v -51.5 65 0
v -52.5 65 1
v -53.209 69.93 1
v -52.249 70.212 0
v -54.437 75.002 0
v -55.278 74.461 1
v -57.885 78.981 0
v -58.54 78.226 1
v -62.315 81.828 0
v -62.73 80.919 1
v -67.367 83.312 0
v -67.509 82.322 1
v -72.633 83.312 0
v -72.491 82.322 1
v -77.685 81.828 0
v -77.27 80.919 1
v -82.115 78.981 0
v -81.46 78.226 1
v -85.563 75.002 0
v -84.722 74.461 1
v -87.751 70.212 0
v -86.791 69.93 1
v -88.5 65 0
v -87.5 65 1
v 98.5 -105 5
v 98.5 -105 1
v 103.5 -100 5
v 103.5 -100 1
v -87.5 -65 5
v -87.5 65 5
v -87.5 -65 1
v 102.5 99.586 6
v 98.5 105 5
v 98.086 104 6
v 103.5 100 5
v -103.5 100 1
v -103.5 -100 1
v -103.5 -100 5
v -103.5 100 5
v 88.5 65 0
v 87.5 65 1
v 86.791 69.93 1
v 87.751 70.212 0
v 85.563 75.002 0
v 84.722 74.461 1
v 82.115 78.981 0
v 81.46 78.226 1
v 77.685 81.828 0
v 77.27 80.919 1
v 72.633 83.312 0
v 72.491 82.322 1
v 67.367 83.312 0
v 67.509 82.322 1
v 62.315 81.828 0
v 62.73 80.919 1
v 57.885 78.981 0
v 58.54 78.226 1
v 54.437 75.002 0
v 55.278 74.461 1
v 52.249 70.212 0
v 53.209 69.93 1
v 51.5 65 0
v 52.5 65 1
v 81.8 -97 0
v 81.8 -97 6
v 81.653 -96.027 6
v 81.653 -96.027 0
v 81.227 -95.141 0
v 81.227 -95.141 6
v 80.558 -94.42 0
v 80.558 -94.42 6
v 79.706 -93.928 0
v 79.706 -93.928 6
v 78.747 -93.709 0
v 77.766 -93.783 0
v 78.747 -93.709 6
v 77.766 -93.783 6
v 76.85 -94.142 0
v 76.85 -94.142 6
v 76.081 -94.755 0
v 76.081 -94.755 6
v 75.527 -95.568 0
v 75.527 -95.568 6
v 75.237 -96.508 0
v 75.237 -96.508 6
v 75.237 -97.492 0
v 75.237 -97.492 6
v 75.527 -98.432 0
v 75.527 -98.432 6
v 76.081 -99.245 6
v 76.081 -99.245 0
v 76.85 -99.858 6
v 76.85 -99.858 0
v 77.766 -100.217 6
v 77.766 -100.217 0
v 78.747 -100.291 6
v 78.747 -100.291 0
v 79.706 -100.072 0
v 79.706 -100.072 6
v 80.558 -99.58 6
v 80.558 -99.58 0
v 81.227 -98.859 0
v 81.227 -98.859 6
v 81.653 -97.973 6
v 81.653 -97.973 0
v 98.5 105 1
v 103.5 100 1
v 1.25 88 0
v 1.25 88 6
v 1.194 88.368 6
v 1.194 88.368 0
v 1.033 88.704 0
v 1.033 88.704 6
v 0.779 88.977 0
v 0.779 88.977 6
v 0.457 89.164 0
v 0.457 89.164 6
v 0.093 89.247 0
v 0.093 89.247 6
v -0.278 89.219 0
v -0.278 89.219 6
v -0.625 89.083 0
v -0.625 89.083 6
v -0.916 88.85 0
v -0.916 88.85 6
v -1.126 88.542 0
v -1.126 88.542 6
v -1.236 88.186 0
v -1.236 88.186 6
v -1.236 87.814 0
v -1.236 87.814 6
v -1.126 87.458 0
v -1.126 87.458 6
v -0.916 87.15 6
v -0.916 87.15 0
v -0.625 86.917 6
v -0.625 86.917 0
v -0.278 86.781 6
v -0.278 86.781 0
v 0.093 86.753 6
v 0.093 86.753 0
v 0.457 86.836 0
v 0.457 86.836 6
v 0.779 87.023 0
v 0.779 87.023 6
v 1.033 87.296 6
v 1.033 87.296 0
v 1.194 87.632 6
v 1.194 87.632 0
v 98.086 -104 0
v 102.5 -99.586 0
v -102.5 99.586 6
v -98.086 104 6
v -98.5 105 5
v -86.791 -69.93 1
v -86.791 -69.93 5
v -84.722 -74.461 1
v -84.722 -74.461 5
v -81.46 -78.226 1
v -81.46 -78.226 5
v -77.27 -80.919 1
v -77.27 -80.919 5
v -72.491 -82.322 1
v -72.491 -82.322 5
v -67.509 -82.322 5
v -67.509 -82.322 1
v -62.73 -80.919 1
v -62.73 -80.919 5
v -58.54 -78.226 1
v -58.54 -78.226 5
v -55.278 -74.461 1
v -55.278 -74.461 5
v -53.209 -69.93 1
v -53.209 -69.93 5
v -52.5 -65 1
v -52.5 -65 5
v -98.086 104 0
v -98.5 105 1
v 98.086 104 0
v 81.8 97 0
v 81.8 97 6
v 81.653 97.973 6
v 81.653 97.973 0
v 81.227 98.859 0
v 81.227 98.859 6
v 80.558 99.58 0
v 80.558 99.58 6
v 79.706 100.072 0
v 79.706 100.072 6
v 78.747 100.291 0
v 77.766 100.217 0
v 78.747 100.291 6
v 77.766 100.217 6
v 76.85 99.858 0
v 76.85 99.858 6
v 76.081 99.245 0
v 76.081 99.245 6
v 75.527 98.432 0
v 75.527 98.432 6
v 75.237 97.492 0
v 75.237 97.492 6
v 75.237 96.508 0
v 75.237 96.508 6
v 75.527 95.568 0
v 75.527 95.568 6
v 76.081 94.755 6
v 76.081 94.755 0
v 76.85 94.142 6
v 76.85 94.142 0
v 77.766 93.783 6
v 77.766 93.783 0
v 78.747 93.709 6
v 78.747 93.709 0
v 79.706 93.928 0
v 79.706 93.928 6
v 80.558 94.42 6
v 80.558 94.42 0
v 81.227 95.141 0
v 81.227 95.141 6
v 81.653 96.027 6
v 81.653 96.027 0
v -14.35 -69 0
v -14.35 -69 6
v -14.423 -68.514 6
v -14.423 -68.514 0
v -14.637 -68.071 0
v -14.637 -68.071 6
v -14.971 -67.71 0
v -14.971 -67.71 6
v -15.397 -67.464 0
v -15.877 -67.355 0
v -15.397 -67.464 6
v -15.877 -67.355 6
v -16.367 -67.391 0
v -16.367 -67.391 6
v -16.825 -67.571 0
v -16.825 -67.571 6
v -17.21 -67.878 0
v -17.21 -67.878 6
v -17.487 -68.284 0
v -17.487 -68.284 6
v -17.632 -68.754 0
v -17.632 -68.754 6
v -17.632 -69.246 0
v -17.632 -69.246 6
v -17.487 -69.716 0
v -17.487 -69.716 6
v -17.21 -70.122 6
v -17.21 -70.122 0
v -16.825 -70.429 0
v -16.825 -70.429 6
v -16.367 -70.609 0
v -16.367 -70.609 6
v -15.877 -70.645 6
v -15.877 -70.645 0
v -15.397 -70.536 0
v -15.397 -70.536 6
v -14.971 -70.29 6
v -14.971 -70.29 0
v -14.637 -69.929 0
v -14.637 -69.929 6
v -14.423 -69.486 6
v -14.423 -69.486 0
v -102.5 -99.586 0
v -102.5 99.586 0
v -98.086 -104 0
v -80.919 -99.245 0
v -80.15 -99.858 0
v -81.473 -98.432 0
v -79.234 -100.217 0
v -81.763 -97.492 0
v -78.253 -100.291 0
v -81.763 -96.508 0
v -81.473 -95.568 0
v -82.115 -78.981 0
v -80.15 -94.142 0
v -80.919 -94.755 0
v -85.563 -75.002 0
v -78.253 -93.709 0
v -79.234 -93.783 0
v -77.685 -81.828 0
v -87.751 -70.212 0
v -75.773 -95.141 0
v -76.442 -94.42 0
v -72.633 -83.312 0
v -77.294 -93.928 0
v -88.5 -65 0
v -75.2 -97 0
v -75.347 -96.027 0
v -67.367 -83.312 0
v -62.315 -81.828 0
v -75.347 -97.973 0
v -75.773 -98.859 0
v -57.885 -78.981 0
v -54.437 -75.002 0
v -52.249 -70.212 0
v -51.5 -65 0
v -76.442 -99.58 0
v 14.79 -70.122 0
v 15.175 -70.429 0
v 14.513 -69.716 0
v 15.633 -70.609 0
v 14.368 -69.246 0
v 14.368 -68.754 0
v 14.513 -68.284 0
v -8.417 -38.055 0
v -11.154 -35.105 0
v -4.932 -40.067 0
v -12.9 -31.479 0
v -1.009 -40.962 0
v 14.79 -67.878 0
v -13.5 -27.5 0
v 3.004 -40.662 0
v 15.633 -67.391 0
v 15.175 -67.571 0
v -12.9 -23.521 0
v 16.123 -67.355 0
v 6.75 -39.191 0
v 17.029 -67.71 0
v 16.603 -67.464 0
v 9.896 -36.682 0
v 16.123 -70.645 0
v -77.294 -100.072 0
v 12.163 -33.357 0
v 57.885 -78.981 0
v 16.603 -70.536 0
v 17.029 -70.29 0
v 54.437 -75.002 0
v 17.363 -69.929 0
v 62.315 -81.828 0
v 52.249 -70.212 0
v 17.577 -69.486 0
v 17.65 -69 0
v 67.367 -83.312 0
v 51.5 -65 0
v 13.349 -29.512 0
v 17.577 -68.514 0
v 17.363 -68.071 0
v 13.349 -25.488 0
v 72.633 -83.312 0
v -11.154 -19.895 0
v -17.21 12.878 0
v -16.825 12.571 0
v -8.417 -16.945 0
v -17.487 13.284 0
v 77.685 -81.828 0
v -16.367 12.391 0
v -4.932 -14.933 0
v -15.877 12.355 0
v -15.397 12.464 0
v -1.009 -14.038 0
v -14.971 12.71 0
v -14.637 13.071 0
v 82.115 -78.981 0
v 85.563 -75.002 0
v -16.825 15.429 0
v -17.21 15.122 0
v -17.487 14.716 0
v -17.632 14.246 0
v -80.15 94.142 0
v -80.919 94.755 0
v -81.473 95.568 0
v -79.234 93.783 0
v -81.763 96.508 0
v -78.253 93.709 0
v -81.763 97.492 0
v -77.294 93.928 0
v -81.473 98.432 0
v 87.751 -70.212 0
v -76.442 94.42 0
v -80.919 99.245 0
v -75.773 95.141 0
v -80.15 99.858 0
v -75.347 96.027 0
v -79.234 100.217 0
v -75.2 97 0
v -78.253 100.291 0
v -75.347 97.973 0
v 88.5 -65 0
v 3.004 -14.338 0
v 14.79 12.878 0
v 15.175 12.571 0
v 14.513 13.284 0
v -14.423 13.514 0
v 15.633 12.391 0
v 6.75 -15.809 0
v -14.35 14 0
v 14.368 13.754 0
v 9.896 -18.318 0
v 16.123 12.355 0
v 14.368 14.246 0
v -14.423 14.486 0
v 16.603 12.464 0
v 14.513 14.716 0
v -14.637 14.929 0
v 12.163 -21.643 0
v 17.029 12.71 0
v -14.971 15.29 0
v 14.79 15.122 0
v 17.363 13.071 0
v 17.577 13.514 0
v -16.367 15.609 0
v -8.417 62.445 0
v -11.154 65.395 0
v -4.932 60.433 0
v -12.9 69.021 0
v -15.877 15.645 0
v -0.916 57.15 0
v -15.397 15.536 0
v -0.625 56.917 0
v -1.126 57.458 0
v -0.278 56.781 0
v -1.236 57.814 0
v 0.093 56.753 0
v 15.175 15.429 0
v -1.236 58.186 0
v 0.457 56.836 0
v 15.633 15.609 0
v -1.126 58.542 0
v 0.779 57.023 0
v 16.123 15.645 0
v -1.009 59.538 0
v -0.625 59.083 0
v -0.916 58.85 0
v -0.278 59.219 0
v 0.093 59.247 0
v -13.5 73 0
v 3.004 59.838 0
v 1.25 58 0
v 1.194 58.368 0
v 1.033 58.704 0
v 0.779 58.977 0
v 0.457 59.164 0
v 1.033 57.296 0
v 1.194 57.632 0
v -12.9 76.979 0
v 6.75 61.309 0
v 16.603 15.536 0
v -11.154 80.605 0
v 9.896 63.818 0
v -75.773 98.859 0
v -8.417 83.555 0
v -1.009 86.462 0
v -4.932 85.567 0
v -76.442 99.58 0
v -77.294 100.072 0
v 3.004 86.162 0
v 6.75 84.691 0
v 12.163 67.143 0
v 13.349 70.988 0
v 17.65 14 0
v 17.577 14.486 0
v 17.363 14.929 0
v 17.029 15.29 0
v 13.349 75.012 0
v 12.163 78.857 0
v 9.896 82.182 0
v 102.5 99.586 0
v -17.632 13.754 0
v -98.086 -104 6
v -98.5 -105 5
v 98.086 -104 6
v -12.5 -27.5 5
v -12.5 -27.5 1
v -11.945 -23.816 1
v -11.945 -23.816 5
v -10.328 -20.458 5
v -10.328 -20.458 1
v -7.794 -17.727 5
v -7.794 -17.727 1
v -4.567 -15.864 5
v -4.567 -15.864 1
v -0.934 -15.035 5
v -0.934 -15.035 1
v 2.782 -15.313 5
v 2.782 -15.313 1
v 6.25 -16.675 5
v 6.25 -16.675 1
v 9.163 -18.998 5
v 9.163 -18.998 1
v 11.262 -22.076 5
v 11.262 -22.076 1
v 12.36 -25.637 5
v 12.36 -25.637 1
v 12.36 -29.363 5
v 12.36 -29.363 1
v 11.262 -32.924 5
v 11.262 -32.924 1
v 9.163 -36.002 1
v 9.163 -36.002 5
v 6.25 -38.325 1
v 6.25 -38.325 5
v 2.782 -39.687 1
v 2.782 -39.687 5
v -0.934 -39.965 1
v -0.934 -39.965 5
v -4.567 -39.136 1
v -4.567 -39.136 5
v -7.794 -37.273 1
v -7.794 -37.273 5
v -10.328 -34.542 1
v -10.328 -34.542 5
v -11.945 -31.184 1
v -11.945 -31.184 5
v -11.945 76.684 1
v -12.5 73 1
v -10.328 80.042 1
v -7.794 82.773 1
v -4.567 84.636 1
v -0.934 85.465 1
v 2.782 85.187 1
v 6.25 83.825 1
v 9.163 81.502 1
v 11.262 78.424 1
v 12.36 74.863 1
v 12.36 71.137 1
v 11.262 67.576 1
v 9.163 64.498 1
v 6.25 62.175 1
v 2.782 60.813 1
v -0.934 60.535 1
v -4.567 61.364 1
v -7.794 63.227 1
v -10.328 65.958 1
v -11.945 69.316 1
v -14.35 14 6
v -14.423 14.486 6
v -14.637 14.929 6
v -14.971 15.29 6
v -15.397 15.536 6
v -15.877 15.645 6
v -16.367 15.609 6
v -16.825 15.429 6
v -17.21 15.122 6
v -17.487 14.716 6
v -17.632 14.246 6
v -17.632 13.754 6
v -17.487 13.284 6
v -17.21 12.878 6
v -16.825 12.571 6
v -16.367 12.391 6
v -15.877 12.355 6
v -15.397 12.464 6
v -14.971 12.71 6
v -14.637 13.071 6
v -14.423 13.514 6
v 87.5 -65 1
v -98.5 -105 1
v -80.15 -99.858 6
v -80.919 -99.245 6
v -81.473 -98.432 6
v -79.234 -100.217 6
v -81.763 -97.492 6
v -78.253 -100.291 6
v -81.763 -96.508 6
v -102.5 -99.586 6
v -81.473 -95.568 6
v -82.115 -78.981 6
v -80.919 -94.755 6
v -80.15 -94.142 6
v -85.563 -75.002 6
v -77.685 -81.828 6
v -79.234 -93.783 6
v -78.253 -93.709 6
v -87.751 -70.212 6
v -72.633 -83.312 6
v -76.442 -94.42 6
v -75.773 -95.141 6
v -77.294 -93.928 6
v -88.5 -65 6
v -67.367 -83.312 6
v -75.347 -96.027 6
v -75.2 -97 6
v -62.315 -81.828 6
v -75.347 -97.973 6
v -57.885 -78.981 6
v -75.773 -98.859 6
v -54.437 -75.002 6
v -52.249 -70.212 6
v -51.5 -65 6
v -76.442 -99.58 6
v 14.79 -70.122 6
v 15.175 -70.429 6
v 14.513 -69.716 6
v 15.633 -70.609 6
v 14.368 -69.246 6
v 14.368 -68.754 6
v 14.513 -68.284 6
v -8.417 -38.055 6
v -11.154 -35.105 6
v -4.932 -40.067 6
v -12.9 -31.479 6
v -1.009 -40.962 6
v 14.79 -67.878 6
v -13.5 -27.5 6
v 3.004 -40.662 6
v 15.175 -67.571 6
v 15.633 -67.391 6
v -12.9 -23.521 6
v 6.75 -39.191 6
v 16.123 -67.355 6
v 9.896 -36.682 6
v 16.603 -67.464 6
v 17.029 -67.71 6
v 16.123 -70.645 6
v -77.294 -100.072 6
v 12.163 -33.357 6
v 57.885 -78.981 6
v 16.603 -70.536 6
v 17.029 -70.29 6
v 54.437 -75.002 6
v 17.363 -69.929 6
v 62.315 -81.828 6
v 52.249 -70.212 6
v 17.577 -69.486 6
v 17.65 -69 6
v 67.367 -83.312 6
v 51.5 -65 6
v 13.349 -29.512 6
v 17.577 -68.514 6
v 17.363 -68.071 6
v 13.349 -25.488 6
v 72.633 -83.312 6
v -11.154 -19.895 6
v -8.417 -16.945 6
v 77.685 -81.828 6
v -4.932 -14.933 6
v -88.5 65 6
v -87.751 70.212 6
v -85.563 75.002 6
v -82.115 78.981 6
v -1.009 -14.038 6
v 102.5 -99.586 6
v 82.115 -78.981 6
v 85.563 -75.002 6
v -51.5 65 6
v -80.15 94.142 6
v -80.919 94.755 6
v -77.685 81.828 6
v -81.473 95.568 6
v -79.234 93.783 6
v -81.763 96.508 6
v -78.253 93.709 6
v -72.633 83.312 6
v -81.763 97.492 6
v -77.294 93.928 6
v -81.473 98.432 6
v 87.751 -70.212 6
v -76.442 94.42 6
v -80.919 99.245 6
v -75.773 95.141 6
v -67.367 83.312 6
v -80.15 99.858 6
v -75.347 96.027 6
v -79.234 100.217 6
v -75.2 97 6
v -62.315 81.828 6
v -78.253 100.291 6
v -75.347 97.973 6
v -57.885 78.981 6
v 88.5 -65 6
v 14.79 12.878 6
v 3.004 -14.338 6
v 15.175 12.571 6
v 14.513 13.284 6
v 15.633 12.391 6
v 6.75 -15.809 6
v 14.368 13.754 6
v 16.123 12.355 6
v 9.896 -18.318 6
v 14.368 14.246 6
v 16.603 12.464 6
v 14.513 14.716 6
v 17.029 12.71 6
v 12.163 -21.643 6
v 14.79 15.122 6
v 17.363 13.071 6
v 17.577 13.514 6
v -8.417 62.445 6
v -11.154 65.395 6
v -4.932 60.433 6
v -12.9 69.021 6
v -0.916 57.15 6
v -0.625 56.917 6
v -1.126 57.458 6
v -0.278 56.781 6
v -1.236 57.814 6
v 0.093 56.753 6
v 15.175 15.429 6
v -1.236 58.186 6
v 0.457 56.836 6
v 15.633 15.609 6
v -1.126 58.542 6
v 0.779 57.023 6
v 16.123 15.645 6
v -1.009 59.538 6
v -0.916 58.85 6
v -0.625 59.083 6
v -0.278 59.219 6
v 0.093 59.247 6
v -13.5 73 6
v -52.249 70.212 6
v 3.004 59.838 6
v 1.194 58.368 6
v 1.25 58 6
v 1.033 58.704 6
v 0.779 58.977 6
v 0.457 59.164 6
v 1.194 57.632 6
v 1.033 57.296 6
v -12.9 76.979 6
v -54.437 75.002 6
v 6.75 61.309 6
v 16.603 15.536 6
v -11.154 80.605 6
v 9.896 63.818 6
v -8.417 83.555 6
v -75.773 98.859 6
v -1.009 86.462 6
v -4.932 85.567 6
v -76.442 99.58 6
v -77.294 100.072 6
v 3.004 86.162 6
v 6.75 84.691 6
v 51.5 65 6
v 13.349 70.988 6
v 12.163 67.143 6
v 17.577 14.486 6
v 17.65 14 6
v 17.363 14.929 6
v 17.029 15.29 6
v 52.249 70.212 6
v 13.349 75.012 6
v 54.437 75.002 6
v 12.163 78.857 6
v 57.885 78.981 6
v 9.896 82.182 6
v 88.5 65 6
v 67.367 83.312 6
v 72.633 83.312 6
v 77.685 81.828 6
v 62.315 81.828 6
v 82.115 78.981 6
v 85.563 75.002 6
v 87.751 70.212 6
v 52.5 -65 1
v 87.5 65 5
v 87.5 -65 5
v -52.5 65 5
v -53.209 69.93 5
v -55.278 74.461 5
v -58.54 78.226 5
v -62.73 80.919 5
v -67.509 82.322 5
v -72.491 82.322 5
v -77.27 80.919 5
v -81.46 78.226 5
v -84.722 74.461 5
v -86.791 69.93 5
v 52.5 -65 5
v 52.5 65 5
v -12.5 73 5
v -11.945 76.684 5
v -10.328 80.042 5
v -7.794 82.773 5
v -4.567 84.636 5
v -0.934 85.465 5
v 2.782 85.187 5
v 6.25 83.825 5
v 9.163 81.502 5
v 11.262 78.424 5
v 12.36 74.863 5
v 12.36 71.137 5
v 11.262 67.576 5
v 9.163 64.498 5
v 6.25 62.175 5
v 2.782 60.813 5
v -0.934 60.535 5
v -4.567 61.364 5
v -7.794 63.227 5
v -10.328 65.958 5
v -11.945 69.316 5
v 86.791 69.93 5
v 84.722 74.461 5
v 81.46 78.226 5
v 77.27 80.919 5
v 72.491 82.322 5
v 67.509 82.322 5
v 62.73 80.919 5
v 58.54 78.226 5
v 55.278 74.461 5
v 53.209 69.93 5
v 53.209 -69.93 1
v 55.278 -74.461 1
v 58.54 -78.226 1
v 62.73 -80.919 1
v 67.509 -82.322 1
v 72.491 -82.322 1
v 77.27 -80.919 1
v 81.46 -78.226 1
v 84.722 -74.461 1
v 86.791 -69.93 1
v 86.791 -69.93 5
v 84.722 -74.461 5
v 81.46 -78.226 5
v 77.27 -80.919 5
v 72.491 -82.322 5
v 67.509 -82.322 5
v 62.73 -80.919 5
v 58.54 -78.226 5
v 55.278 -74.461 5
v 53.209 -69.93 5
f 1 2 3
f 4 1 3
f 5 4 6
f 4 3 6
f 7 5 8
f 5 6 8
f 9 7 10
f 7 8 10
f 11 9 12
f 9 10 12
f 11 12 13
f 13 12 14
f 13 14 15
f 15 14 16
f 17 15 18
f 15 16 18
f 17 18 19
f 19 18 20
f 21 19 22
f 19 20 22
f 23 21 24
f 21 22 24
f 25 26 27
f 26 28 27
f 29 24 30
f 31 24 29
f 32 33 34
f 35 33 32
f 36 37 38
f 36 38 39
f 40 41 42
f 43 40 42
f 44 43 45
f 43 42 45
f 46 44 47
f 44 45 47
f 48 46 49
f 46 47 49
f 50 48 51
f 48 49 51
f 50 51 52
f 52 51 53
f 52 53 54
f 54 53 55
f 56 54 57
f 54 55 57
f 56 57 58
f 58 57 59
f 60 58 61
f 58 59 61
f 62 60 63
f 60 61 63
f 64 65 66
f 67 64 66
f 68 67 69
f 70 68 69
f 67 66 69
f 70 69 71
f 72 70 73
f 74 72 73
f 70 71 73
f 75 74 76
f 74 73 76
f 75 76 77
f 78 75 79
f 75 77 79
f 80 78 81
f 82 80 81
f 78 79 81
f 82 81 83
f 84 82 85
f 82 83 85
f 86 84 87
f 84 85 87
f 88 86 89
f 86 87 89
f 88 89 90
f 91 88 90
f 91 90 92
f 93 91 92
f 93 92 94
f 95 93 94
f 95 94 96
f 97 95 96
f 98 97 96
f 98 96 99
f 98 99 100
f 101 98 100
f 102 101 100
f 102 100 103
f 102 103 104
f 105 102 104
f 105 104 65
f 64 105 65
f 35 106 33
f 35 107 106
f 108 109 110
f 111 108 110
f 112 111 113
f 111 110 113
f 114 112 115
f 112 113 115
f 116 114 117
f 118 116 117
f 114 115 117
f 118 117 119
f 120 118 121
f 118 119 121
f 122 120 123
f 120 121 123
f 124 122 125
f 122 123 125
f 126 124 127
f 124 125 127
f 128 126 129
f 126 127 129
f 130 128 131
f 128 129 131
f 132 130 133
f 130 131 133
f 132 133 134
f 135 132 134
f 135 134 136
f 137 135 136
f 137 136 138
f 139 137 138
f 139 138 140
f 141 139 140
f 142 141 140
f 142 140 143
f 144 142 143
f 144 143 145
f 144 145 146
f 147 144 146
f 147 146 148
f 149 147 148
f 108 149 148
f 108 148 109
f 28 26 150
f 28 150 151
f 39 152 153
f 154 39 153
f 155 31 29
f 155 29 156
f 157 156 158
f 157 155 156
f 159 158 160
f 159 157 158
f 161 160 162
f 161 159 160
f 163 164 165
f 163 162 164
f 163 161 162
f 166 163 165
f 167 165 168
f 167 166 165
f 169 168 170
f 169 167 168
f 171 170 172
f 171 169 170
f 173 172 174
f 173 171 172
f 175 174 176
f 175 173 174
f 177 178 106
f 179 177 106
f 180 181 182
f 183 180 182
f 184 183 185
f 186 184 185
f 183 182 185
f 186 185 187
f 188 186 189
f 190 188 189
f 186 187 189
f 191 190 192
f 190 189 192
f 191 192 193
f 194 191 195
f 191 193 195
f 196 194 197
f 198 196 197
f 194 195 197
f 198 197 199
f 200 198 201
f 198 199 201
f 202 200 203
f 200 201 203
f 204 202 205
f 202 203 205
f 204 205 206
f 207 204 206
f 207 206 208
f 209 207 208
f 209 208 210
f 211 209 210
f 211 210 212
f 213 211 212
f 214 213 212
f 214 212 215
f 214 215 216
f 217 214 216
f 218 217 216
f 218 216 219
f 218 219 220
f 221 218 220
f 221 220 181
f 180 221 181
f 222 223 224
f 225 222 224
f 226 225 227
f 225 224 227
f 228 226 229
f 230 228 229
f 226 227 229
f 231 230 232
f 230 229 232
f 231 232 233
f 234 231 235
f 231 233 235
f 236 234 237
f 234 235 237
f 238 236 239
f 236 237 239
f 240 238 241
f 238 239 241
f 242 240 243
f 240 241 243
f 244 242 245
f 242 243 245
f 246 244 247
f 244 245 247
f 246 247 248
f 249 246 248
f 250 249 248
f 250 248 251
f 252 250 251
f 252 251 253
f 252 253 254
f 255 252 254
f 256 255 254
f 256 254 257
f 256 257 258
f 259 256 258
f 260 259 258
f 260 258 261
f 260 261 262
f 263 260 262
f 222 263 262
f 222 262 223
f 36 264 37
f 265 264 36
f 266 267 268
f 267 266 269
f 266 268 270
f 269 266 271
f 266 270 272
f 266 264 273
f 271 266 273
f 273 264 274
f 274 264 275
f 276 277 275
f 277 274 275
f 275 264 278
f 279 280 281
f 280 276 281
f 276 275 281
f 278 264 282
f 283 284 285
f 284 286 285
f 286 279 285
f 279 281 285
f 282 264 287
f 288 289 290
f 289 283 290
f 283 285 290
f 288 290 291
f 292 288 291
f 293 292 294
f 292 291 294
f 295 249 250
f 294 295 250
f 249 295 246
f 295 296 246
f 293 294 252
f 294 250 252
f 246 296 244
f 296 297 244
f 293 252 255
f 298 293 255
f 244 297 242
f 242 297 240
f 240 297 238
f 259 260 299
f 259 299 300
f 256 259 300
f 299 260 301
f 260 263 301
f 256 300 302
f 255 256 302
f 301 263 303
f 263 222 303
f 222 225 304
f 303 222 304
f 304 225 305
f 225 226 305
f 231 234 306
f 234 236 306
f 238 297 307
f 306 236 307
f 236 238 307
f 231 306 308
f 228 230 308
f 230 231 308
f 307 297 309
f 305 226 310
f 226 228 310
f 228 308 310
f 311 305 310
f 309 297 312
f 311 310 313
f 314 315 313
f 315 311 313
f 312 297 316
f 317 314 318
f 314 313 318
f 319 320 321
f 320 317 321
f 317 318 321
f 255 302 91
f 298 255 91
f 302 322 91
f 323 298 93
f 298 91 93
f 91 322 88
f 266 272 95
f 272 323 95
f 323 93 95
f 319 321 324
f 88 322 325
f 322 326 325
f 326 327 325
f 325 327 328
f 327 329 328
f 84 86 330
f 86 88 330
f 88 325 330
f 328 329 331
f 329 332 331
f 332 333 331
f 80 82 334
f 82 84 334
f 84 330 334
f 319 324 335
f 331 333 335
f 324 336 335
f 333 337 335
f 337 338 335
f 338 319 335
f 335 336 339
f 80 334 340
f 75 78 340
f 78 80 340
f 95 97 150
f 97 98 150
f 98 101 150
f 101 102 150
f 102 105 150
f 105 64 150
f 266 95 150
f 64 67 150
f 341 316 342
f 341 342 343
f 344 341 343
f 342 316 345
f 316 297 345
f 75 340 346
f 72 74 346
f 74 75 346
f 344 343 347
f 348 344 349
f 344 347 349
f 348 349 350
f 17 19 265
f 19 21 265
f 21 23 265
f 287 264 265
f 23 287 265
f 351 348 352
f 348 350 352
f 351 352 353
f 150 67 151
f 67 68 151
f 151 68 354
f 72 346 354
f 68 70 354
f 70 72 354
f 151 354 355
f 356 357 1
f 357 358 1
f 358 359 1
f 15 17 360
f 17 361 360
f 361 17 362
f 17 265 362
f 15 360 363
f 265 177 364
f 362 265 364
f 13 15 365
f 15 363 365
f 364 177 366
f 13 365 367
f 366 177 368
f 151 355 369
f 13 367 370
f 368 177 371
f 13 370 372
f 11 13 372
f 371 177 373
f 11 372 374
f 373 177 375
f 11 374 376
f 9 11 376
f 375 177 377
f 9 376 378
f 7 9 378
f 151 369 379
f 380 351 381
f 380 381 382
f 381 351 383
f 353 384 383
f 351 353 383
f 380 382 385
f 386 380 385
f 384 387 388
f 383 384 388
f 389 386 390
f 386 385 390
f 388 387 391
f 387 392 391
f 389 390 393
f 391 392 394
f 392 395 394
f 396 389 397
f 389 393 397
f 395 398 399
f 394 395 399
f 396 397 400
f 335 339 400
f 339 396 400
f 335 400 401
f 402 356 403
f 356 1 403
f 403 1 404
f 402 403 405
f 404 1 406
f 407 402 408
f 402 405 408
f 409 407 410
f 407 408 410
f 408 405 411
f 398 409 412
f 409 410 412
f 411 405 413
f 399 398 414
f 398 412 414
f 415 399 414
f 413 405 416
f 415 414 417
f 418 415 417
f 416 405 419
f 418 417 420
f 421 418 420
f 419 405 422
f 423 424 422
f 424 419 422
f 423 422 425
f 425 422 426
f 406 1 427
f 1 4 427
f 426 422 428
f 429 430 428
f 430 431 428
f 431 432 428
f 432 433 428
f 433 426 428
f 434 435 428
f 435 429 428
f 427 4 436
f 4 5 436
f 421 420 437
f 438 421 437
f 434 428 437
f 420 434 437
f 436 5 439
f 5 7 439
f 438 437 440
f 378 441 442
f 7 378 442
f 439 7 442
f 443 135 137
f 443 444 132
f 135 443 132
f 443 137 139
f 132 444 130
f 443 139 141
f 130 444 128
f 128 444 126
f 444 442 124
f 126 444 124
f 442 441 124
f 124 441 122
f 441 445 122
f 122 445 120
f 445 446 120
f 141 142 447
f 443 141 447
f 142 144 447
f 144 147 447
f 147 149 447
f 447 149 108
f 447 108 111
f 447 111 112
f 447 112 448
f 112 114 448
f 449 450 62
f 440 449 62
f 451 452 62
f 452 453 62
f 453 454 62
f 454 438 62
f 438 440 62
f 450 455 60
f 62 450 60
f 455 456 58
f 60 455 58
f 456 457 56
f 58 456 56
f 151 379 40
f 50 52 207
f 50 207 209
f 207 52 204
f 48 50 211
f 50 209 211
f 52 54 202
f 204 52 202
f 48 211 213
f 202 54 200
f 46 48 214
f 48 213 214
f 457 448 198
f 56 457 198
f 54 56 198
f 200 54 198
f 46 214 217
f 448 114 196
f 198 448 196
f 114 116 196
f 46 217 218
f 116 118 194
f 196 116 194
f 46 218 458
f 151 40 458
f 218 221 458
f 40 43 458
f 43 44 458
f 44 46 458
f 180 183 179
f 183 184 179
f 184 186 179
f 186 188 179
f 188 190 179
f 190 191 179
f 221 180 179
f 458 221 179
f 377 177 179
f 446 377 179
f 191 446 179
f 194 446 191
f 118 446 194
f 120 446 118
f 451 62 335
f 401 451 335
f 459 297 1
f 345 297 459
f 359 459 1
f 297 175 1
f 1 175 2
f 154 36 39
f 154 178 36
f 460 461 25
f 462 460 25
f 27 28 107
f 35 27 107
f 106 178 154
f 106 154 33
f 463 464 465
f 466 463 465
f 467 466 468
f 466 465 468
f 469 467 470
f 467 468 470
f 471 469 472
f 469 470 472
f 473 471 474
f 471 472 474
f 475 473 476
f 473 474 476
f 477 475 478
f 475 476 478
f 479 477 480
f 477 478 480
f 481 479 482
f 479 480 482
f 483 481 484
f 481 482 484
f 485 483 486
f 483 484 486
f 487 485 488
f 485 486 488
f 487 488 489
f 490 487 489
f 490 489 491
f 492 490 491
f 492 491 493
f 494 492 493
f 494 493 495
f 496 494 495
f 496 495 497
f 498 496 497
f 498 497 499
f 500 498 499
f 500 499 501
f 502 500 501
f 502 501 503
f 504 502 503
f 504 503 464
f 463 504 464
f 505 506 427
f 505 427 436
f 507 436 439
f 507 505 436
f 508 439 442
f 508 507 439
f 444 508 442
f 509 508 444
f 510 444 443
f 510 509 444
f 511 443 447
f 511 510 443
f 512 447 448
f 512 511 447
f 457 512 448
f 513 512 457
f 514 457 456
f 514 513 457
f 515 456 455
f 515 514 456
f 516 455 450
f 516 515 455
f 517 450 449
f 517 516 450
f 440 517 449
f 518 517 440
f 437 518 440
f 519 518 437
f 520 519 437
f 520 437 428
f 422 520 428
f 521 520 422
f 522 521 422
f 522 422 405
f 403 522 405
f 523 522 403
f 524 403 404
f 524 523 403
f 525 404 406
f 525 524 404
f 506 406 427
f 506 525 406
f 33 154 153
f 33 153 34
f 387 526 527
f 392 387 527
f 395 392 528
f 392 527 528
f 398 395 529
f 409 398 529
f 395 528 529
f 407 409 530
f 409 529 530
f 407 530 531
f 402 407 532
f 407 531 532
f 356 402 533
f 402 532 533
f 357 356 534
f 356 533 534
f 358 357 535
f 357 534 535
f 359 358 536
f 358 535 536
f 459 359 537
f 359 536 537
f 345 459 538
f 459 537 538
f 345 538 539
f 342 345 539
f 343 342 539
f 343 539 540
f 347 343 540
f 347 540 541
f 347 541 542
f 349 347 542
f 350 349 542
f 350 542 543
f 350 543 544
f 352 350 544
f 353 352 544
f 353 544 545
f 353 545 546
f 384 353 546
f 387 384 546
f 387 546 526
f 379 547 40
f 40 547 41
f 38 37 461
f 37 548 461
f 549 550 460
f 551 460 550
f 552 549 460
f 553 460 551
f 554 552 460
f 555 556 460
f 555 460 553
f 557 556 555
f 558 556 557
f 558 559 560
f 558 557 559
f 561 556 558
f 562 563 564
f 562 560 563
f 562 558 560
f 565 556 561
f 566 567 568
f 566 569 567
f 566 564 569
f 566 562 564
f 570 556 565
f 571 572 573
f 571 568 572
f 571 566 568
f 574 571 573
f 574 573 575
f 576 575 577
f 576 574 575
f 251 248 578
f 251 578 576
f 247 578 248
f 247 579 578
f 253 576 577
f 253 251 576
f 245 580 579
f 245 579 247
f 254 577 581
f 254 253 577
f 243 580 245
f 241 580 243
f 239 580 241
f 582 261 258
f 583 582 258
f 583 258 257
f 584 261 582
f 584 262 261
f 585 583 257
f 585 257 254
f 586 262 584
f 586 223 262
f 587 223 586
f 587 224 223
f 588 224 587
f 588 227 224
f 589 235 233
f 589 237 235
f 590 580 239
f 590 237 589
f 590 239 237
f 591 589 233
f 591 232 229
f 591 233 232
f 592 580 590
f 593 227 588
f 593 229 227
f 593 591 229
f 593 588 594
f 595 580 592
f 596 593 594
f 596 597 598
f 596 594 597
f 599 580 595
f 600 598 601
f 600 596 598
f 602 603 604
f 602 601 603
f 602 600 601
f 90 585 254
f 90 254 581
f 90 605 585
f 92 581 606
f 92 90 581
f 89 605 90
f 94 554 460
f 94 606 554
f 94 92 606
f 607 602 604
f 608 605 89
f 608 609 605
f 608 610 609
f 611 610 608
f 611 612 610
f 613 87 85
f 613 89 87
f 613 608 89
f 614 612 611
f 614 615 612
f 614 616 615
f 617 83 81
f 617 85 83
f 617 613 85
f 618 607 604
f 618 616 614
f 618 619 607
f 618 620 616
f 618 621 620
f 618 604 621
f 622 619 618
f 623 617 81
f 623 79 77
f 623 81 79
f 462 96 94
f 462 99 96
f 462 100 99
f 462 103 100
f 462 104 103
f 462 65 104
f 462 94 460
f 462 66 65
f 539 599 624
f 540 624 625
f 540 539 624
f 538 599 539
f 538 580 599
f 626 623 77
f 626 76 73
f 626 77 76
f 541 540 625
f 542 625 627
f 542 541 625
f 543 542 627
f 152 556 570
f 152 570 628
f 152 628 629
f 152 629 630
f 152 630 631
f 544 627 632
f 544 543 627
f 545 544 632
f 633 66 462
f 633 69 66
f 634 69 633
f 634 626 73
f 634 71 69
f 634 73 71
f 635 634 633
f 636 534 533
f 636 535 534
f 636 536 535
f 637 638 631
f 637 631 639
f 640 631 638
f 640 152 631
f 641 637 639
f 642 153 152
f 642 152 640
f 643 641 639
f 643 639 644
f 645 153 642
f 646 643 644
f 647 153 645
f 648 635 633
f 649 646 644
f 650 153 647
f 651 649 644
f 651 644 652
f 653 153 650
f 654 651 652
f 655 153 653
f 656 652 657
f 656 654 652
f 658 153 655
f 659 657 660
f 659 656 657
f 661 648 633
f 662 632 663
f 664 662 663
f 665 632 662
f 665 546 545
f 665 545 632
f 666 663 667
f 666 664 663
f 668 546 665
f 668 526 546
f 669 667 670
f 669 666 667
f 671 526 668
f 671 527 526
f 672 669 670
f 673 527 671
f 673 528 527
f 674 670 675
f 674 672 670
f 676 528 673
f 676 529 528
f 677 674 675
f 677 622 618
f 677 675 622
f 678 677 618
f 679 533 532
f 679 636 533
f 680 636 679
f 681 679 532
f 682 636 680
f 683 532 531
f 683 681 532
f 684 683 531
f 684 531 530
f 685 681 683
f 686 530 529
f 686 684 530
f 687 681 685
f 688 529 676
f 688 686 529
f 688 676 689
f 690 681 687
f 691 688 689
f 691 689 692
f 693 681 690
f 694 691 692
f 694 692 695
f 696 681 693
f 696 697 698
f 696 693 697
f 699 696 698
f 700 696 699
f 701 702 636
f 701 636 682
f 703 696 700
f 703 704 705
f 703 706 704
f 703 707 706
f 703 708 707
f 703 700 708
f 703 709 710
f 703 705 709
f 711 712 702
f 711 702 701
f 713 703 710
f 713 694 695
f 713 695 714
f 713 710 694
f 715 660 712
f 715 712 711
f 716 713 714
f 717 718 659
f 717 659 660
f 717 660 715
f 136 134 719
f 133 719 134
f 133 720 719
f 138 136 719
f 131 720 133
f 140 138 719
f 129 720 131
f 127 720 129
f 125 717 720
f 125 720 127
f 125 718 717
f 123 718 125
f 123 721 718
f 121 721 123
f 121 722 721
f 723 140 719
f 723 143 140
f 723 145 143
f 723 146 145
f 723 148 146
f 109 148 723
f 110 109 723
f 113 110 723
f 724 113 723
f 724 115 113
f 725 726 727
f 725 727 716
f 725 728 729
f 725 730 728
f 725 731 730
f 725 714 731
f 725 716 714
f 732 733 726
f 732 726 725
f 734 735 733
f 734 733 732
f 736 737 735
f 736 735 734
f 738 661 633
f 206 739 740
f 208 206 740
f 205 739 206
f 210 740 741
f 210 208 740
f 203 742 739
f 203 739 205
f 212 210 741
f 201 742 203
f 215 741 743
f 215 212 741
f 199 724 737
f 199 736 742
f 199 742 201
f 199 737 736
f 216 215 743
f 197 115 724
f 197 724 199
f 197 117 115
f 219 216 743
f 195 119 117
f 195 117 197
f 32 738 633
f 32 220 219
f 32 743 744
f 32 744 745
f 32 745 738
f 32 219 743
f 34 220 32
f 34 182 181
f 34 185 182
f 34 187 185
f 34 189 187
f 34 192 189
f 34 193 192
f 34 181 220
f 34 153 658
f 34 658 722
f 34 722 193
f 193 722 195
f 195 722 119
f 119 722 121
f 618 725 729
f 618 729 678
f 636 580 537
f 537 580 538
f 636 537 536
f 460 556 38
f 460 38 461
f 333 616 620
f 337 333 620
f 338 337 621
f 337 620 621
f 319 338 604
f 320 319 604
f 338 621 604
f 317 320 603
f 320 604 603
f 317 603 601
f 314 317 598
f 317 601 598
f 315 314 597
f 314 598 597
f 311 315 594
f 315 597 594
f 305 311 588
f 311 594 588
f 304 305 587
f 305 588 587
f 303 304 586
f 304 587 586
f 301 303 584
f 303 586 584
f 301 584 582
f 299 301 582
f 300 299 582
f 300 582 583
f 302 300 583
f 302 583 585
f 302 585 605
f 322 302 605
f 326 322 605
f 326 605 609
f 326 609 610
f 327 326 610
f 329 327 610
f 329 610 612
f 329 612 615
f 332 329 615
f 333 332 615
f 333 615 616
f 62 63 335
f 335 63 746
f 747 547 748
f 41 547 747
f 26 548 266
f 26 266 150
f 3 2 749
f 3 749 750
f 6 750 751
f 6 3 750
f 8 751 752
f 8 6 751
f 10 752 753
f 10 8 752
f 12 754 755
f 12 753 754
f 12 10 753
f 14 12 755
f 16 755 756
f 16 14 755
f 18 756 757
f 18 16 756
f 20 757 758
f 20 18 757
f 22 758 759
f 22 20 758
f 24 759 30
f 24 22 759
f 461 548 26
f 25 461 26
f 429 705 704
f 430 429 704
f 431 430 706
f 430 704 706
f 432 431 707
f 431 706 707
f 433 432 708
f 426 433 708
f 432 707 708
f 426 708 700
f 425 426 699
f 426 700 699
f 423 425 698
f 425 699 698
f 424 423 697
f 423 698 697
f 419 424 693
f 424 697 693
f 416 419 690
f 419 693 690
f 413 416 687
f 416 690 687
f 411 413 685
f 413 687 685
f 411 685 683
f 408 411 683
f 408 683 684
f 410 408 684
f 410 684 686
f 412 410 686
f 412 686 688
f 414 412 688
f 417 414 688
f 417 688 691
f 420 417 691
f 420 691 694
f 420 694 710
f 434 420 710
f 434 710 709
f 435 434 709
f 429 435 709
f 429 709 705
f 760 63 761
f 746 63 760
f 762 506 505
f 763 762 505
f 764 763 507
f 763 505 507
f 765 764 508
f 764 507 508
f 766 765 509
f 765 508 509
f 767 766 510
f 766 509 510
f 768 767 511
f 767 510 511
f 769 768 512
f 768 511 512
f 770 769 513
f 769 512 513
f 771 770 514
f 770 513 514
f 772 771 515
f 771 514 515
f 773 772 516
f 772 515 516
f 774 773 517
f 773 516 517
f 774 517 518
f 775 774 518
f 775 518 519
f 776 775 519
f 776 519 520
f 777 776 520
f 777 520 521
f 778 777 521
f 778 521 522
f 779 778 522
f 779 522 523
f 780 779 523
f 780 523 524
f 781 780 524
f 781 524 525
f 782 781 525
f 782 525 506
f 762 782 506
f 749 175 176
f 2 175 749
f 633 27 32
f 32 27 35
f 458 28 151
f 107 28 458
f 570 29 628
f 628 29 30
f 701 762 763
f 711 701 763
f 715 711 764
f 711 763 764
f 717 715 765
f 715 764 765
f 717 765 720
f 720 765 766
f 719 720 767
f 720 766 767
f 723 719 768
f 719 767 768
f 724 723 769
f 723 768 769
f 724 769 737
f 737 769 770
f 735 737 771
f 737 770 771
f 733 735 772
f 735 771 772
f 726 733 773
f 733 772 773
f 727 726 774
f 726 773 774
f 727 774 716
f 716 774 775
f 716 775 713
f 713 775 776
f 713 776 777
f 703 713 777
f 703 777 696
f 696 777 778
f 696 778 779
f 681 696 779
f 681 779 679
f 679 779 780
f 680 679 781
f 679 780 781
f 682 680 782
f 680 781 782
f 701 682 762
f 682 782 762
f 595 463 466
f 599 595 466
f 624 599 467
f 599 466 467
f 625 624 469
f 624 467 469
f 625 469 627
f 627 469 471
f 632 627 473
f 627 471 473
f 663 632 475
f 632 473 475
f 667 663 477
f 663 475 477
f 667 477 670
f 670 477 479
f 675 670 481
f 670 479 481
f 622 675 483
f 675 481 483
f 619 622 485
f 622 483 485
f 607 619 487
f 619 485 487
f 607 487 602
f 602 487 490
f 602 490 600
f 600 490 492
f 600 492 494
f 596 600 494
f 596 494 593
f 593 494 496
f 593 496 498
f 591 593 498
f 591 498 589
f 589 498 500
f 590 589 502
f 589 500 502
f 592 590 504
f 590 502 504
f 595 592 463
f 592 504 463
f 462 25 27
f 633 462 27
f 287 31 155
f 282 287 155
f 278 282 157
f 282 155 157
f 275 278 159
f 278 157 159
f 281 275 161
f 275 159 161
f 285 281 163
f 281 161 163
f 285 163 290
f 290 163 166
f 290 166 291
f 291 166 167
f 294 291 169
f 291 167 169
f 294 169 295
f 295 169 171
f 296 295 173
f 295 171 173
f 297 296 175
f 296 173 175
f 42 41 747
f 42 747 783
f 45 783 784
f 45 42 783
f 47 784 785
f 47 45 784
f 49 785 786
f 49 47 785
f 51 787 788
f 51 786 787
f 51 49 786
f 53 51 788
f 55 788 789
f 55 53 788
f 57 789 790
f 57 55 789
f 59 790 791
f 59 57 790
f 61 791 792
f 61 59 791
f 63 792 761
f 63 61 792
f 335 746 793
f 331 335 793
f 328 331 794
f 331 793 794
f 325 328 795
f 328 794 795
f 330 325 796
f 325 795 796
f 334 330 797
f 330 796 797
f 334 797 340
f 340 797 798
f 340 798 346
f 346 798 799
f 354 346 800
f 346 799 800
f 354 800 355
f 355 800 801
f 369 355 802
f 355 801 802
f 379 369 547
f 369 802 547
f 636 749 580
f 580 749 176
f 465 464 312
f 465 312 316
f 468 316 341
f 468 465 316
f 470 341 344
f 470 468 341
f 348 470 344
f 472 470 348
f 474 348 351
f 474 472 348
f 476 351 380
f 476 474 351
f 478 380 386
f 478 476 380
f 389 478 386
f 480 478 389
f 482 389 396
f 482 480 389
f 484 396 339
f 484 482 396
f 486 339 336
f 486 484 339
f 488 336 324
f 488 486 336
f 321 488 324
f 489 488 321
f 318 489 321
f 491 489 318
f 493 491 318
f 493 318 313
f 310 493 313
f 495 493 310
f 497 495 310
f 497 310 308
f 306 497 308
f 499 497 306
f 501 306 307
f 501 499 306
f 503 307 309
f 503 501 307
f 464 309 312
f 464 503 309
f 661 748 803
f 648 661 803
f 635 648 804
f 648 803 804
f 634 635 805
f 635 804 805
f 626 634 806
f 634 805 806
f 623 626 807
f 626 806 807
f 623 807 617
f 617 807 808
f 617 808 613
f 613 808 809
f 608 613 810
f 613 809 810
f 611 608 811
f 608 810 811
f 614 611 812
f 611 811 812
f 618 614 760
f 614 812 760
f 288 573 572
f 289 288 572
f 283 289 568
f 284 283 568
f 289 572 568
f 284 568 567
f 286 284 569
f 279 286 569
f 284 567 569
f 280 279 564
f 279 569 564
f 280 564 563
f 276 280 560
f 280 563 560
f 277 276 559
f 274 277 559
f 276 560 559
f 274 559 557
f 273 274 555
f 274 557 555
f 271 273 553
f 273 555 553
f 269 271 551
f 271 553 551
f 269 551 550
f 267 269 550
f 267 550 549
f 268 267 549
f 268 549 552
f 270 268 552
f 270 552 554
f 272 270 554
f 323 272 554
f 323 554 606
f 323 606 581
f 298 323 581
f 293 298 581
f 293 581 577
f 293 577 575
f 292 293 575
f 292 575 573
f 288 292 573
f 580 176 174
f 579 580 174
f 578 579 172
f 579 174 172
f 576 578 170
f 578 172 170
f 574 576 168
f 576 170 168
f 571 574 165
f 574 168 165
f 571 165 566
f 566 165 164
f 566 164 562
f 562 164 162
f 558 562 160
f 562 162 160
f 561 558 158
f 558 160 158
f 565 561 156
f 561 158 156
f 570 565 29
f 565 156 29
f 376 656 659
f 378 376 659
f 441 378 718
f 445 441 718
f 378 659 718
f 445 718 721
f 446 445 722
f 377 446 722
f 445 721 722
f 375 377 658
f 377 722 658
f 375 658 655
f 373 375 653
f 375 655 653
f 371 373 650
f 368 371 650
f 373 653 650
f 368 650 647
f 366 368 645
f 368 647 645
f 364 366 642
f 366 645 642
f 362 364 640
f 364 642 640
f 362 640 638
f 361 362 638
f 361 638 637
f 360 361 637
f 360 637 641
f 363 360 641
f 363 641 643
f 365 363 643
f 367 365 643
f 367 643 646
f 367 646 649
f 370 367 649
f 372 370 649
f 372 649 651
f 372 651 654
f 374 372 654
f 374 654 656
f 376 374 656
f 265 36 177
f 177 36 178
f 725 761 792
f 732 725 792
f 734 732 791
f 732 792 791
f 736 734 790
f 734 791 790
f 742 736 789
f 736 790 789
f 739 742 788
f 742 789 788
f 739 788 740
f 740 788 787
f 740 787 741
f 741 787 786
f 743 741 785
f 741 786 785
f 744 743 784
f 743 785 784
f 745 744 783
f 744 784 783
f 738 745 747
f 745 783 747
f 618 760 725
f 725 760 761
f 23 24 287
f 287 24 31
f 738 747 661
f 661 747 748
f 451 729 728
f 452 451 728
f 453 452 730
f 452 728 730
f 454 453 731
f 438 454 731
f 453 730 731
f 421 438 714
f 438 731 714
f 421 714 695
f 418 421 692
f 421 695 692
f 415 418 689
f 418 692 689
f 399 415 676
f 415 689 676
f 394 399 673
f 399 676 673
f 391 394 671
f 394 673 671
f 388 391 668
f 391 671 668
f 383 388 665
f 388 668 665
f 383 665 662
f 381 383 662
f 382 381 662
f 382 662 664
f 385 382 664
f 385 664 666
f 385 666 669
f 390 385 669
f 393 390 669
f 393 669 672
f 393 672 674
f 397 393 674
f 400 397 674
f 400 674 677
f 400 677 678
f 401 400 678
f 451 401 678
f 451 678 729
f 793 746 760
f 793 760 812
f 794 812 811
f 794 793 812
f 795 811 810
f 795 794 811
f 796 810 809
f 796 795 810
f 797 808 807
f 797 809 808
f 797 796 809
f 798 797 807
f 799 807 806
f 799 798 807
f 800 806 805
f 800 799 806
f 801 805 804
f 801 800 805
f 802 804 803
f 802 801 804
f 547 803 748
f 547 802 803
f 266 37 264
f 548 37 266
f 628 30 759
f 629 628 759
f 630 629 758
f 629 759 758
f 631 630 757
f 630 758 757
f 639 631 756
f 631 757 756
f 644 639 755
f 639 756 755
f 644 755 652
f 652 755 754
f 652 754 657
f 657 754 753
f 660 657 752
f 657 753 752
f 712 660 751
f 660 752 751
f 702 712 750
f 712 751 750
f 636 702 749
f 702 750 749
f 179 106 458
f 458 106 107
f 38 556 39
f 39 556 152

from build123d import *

# Parameters (mm, degrees)
SKETCH_1_W             = 207
SKETCH_1_H             = 210
EXTRUDE_1_DEPTH        = 6
SKETCH_2_R             = 3.3
CUT_EXTRUDE_1_DEPTH    = 148.557615866
CHAMFER_2_SIZE         = 5
CHAMFER_1_SIZE         = 1
HOLE_WIZARD_M4_1_D     = 3.3
HOLE_WIZARD_M4_1_DEPTH = 10.1
HOLE_WIZARD_M4_1_TIP   = 0.991420021
HOLE_WIZARD_M3_1_D     = 2.5
HOLE_WIZARD_M3_1_DEPTH = 7.5
HOLE_WIZARD_M3_1_TIP   = 0.751075774
SKETCH_7_R             = 12.5
CUT_EXTRUDE_2_DEPTH    = 148.557615866
SKETCH_8_R             = 12.5
CUT_EXTRUDE_3_DEPTH    = 148.557615866
CUT_EXTRUDE_4_DEPTH    = 148.557615866
CHAMFER_3_SIZE         = 1


with BuildPart() as part:
    # 草图1 → 凸台-拉伸1 (new body)
    with BuildSketch(Plane.XY):
        Rectangle(SKETCH_1_W, SKETCH_1_H)
    extrude(amount=EXTRUDE_1_DEPTH)

    # 草图2 → 切除-拉伸1 (cut, through all)
    with BuildSketch(Plane.XY.offset(6)):
        with Locations((-78.5, 97)):
            Circle(SKETCH_2_R)
        with Locations((78.5, 97)):
            Circle(SKETCH_2_R)
        with Locations((-78.5, -97)):
            Circle(SKETCH_2_R)
        with Locations((78.5, -97)):
            Circle(SKETCH_2_R)
    extrude(amount=-CUT_EXTRUDE_1_DEPTH, mode=Mode.SUBTRACT)

    # 倒角2
    chamfer_2_edges = [part.edges().sort_by_distance(p)[0] for p in [
        (103.5, -105, 3),
        (-103.5, -105, 3),
        (-103.5, 105, 3),
        (103.5, 105, 3),
    ]]
    chamfer(chamfer_2_edges, length=CHAMFER_2_SIZE)

    # 倒角1
    chamfer_1_edges = [part.edges().sort_by_distance(p)[0] for p in [
        (0, -105, 0),
        (0, -105, 6),
        (103.5, 0, 0),
        (-103.5, 0, 0),
        (0, 105, 0),
        (101, 102.5, 0),
        (-101, 102.5, 0),
        (101, -102.5, 0),
        (-101, -102.5, 0),
        (-103.5, 0, 6),
        (103.5, 0, 6),
        (0, 105, 6),
        (101, 102.5, 6),
        (-101, 102.5, 6),
        (101, -102.5, 6),
        (-101, -102.5, 6),
    ]]
    chamfer(chamfer_1_edges, length=CHAMFER_1_SIZE)

    # M4 螺纹孔1
    with Locations(Plane(origin=(0, 0, 0), x_dir=(-1, 0, 0), z_dir=(0, 0, -1))):
        with Locations((-16, 14), (16, 14), (16, -69), (-16, -69)):
            Hole(HOLE_WIZARD_M4_1_D / 2, depth=HOLE_WIZARD_M4_1_DEPTH)
            with Locations((0, 0, -(HOLE_WIZARD_M4_1_DEPTH + HOLE_WIZARD_M4_1_TIP / 2))):  # 118° drill point
                Cone(0, HOLE_WIZARD_M4_1_D / 2, HOLE_WIZARD_M4_1_TIP, mode=Mode.SUBTRACT)

    # M3 螺纹孔1
    with Locations(Plane(origin=(0, 0, 0), x_dir=(-1, 0, 0), z_dir=(0, 0, -1))):
        with Locations((0, 58), (0, 88)):
            Hole(HOLE_WIZARD_M3_1_D / 2, depth=HOLE_WIZARD_M3_1_DEPTH)
            with Locations((0, 0, -(HOLE_WIZARD_M3_1_DEPTH + HOLE_WIZARD_M3_1_TIP / 2))):  # 118° drill point
                Cone(0, HOLE_WIZARD_M3_1_D / 2, HOLE_WIZARD_M3_1_TIP, mode=Mode.SUBTRACT)

    # 草图7 → 切除-拉伸2 (cut, through all)
    with BuildSketch(Plane(origin=(0, 0, 0), x_dir=(-1, 0, 0), z_dir=(0, 0, -1))):
        with Locations((0, 73)):
            Circle(SKETCH_7_R)
    extrude(amount=-CUT_EXTRUDE_2_DEPTH, mode=Mode.SUBTRACT)

    # 草图8 → 切除-拉伸3 (cut, through all)
    with BuildSketch(Plane(origin=(0, 0, 0), x_dir=(-1, 0, 0), z_dir=(0, 0, -1))):
        with Locations((0, -27.5)):
            Circle(SKETCH_8_R)
    extrude(amount=-CUT_EXTRUDE_3_DEPTH, mode=Mode.SUBTRACT)

    # 草图9 → 切除-拉伸4 (cut, through all)
    with BuildSketch(Plane(origin=(0, 0, 0), x_dir=(-1, 0, 0), z_dir=(0, 0, -1))):
        with BuildLine():
            Line((-87.5, -65), (-87.5, 65))
            ThreePointArc((-87.5, 65), (-70, 82.5), (-52.5, 65))
            Line((-52.5, 65), (-52.5, -65))
            ThreePointArc((-52.5, -65), (-70, -82.5), (-87.5, -65))
        make_face()
        with BuildLine():
            Line((52.5, -65), (52.5, 65))
            ThreePointArc((52.5, 65), (70, 82.5), (87.5, 65))
            Line((87.5, 65), (87.5, -65))
            ThreePointArc((87.5, -65), (70, -82.5), (52.5, -65))
        make_face()
    extrude(amount=-CUT_EXTRUDE_4_DEPTH, mode=Mode.SUBTRACT)

    # 倒角3
    chamfer_3_edges = [part.edges().sort_by_distance(p)[0] for p in [
        (12.5, 73, 6),
        (12.5, 73, 0),
        (12.5, -27.5, 6),
        (12.5, -27.5, 0),
        (70, -82.5, 6),
        (87.5, 0, 6),
        (70, 82.5, 6),
        (52.5, 0, 6),
        (70, -82.5, 0),
        (52.5, 0, 0),
        (70, 82.5, 0),
        (87.5, 0, 0),
        (-70, -82.5, 6),
        (-52.5, 0, 6),
        (-70, 82.5, 6),
        (-87.5, 0, 6),
        (-70, -82.5, 0),
        (-87.5, 0, 0),
        (-70, 82.5, 0),
        (-52.5, 0, 0),
    ]]
    chamfer(chamfer_3_edges, length=CHAMFER_3_SIZE)


solid = part.part
